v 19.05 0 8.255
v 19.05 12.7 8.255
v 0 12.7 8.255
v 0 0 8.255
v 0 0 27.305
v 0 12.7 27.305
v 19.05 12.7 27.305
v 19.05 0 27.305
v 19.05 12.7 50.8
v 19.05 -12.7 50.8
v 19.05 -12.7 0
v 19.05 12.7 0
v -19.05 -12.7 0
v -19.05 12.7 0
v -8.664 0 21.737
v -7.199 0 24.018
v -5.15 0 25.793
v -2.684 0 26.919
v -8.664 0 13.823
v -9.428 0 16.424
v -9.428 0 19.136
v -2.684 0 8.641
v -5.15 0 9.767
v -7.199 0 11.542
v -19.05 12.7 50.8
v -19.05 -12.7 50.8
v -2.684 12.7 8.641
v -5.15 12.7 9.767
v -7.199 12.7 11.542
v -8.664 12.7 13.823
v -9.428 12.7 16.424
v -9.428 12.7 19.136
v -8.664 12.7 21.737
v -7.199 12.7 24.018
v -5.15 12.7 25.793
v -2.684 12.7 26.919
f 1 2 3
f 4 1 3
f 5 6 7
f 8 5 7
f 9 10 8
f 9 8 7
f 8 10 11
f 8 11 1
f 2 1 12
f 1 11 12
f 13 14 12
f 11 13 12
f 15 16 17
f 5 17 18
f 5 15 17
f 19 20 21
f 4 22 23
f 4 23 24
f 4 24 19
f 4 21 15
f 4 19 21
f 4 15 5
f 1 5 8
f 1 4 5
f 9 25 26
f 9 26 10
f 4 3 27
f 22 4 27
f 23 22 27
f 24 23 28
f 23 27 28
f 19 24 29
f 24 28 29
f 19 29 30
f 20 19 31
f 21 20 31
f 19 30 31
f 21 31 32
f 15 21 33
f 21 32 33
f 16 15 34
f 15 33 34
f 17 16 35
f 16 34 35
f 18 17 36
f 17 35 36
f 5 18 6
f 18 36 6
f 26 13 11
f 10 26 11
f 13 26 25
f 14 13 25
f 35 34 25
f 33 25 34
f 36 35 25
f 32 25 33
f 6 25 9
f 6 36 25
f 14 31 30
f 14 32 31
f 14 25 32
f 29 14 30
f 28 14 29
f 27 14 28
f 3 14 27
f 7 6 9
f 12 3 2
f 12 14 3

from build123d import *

# Parameters (mm, degrees)
SKETCH1_W           = 38.1
SKETCH1_H           = 25.4
BOSS_EXTRUDE1_DEPTH = 50.8
CUT_EXTRUDE1_DEPTH  = 12.7


with BuildPart() as part:
    # Sketch1 → Boss-Extrude1 (new body)
    with BuildSketch(Plane.XY):
        Rectangle(SKETCH1_W, SKETCH1_H)
    extrude(amount=BOSS_EXTRUDE1_DEPTH)

    # Sketch2 → Cut-Extrude1 (cut)
    with BuildSketch(Plane(origin=(0, 12.7, 0), x_dir=(1, 0, 0), z_dir=(0, 1, 0))):
        with BuildLine():
            Line((19.05, -8.255), (0, -8.255))
            ThreePointArc((0, -8.255), (-9.525, -17.78), (0, -27.305))
            Line((0, -27.305), (19.05, -27.305))
            Line((19.05, -27.305), (19.05, -8.255))
        make_face()
    extrude(amount=-CUT_EXTRUDE1_DEPTH, mode=Mode.SUBTRACT)


solid = part.part
